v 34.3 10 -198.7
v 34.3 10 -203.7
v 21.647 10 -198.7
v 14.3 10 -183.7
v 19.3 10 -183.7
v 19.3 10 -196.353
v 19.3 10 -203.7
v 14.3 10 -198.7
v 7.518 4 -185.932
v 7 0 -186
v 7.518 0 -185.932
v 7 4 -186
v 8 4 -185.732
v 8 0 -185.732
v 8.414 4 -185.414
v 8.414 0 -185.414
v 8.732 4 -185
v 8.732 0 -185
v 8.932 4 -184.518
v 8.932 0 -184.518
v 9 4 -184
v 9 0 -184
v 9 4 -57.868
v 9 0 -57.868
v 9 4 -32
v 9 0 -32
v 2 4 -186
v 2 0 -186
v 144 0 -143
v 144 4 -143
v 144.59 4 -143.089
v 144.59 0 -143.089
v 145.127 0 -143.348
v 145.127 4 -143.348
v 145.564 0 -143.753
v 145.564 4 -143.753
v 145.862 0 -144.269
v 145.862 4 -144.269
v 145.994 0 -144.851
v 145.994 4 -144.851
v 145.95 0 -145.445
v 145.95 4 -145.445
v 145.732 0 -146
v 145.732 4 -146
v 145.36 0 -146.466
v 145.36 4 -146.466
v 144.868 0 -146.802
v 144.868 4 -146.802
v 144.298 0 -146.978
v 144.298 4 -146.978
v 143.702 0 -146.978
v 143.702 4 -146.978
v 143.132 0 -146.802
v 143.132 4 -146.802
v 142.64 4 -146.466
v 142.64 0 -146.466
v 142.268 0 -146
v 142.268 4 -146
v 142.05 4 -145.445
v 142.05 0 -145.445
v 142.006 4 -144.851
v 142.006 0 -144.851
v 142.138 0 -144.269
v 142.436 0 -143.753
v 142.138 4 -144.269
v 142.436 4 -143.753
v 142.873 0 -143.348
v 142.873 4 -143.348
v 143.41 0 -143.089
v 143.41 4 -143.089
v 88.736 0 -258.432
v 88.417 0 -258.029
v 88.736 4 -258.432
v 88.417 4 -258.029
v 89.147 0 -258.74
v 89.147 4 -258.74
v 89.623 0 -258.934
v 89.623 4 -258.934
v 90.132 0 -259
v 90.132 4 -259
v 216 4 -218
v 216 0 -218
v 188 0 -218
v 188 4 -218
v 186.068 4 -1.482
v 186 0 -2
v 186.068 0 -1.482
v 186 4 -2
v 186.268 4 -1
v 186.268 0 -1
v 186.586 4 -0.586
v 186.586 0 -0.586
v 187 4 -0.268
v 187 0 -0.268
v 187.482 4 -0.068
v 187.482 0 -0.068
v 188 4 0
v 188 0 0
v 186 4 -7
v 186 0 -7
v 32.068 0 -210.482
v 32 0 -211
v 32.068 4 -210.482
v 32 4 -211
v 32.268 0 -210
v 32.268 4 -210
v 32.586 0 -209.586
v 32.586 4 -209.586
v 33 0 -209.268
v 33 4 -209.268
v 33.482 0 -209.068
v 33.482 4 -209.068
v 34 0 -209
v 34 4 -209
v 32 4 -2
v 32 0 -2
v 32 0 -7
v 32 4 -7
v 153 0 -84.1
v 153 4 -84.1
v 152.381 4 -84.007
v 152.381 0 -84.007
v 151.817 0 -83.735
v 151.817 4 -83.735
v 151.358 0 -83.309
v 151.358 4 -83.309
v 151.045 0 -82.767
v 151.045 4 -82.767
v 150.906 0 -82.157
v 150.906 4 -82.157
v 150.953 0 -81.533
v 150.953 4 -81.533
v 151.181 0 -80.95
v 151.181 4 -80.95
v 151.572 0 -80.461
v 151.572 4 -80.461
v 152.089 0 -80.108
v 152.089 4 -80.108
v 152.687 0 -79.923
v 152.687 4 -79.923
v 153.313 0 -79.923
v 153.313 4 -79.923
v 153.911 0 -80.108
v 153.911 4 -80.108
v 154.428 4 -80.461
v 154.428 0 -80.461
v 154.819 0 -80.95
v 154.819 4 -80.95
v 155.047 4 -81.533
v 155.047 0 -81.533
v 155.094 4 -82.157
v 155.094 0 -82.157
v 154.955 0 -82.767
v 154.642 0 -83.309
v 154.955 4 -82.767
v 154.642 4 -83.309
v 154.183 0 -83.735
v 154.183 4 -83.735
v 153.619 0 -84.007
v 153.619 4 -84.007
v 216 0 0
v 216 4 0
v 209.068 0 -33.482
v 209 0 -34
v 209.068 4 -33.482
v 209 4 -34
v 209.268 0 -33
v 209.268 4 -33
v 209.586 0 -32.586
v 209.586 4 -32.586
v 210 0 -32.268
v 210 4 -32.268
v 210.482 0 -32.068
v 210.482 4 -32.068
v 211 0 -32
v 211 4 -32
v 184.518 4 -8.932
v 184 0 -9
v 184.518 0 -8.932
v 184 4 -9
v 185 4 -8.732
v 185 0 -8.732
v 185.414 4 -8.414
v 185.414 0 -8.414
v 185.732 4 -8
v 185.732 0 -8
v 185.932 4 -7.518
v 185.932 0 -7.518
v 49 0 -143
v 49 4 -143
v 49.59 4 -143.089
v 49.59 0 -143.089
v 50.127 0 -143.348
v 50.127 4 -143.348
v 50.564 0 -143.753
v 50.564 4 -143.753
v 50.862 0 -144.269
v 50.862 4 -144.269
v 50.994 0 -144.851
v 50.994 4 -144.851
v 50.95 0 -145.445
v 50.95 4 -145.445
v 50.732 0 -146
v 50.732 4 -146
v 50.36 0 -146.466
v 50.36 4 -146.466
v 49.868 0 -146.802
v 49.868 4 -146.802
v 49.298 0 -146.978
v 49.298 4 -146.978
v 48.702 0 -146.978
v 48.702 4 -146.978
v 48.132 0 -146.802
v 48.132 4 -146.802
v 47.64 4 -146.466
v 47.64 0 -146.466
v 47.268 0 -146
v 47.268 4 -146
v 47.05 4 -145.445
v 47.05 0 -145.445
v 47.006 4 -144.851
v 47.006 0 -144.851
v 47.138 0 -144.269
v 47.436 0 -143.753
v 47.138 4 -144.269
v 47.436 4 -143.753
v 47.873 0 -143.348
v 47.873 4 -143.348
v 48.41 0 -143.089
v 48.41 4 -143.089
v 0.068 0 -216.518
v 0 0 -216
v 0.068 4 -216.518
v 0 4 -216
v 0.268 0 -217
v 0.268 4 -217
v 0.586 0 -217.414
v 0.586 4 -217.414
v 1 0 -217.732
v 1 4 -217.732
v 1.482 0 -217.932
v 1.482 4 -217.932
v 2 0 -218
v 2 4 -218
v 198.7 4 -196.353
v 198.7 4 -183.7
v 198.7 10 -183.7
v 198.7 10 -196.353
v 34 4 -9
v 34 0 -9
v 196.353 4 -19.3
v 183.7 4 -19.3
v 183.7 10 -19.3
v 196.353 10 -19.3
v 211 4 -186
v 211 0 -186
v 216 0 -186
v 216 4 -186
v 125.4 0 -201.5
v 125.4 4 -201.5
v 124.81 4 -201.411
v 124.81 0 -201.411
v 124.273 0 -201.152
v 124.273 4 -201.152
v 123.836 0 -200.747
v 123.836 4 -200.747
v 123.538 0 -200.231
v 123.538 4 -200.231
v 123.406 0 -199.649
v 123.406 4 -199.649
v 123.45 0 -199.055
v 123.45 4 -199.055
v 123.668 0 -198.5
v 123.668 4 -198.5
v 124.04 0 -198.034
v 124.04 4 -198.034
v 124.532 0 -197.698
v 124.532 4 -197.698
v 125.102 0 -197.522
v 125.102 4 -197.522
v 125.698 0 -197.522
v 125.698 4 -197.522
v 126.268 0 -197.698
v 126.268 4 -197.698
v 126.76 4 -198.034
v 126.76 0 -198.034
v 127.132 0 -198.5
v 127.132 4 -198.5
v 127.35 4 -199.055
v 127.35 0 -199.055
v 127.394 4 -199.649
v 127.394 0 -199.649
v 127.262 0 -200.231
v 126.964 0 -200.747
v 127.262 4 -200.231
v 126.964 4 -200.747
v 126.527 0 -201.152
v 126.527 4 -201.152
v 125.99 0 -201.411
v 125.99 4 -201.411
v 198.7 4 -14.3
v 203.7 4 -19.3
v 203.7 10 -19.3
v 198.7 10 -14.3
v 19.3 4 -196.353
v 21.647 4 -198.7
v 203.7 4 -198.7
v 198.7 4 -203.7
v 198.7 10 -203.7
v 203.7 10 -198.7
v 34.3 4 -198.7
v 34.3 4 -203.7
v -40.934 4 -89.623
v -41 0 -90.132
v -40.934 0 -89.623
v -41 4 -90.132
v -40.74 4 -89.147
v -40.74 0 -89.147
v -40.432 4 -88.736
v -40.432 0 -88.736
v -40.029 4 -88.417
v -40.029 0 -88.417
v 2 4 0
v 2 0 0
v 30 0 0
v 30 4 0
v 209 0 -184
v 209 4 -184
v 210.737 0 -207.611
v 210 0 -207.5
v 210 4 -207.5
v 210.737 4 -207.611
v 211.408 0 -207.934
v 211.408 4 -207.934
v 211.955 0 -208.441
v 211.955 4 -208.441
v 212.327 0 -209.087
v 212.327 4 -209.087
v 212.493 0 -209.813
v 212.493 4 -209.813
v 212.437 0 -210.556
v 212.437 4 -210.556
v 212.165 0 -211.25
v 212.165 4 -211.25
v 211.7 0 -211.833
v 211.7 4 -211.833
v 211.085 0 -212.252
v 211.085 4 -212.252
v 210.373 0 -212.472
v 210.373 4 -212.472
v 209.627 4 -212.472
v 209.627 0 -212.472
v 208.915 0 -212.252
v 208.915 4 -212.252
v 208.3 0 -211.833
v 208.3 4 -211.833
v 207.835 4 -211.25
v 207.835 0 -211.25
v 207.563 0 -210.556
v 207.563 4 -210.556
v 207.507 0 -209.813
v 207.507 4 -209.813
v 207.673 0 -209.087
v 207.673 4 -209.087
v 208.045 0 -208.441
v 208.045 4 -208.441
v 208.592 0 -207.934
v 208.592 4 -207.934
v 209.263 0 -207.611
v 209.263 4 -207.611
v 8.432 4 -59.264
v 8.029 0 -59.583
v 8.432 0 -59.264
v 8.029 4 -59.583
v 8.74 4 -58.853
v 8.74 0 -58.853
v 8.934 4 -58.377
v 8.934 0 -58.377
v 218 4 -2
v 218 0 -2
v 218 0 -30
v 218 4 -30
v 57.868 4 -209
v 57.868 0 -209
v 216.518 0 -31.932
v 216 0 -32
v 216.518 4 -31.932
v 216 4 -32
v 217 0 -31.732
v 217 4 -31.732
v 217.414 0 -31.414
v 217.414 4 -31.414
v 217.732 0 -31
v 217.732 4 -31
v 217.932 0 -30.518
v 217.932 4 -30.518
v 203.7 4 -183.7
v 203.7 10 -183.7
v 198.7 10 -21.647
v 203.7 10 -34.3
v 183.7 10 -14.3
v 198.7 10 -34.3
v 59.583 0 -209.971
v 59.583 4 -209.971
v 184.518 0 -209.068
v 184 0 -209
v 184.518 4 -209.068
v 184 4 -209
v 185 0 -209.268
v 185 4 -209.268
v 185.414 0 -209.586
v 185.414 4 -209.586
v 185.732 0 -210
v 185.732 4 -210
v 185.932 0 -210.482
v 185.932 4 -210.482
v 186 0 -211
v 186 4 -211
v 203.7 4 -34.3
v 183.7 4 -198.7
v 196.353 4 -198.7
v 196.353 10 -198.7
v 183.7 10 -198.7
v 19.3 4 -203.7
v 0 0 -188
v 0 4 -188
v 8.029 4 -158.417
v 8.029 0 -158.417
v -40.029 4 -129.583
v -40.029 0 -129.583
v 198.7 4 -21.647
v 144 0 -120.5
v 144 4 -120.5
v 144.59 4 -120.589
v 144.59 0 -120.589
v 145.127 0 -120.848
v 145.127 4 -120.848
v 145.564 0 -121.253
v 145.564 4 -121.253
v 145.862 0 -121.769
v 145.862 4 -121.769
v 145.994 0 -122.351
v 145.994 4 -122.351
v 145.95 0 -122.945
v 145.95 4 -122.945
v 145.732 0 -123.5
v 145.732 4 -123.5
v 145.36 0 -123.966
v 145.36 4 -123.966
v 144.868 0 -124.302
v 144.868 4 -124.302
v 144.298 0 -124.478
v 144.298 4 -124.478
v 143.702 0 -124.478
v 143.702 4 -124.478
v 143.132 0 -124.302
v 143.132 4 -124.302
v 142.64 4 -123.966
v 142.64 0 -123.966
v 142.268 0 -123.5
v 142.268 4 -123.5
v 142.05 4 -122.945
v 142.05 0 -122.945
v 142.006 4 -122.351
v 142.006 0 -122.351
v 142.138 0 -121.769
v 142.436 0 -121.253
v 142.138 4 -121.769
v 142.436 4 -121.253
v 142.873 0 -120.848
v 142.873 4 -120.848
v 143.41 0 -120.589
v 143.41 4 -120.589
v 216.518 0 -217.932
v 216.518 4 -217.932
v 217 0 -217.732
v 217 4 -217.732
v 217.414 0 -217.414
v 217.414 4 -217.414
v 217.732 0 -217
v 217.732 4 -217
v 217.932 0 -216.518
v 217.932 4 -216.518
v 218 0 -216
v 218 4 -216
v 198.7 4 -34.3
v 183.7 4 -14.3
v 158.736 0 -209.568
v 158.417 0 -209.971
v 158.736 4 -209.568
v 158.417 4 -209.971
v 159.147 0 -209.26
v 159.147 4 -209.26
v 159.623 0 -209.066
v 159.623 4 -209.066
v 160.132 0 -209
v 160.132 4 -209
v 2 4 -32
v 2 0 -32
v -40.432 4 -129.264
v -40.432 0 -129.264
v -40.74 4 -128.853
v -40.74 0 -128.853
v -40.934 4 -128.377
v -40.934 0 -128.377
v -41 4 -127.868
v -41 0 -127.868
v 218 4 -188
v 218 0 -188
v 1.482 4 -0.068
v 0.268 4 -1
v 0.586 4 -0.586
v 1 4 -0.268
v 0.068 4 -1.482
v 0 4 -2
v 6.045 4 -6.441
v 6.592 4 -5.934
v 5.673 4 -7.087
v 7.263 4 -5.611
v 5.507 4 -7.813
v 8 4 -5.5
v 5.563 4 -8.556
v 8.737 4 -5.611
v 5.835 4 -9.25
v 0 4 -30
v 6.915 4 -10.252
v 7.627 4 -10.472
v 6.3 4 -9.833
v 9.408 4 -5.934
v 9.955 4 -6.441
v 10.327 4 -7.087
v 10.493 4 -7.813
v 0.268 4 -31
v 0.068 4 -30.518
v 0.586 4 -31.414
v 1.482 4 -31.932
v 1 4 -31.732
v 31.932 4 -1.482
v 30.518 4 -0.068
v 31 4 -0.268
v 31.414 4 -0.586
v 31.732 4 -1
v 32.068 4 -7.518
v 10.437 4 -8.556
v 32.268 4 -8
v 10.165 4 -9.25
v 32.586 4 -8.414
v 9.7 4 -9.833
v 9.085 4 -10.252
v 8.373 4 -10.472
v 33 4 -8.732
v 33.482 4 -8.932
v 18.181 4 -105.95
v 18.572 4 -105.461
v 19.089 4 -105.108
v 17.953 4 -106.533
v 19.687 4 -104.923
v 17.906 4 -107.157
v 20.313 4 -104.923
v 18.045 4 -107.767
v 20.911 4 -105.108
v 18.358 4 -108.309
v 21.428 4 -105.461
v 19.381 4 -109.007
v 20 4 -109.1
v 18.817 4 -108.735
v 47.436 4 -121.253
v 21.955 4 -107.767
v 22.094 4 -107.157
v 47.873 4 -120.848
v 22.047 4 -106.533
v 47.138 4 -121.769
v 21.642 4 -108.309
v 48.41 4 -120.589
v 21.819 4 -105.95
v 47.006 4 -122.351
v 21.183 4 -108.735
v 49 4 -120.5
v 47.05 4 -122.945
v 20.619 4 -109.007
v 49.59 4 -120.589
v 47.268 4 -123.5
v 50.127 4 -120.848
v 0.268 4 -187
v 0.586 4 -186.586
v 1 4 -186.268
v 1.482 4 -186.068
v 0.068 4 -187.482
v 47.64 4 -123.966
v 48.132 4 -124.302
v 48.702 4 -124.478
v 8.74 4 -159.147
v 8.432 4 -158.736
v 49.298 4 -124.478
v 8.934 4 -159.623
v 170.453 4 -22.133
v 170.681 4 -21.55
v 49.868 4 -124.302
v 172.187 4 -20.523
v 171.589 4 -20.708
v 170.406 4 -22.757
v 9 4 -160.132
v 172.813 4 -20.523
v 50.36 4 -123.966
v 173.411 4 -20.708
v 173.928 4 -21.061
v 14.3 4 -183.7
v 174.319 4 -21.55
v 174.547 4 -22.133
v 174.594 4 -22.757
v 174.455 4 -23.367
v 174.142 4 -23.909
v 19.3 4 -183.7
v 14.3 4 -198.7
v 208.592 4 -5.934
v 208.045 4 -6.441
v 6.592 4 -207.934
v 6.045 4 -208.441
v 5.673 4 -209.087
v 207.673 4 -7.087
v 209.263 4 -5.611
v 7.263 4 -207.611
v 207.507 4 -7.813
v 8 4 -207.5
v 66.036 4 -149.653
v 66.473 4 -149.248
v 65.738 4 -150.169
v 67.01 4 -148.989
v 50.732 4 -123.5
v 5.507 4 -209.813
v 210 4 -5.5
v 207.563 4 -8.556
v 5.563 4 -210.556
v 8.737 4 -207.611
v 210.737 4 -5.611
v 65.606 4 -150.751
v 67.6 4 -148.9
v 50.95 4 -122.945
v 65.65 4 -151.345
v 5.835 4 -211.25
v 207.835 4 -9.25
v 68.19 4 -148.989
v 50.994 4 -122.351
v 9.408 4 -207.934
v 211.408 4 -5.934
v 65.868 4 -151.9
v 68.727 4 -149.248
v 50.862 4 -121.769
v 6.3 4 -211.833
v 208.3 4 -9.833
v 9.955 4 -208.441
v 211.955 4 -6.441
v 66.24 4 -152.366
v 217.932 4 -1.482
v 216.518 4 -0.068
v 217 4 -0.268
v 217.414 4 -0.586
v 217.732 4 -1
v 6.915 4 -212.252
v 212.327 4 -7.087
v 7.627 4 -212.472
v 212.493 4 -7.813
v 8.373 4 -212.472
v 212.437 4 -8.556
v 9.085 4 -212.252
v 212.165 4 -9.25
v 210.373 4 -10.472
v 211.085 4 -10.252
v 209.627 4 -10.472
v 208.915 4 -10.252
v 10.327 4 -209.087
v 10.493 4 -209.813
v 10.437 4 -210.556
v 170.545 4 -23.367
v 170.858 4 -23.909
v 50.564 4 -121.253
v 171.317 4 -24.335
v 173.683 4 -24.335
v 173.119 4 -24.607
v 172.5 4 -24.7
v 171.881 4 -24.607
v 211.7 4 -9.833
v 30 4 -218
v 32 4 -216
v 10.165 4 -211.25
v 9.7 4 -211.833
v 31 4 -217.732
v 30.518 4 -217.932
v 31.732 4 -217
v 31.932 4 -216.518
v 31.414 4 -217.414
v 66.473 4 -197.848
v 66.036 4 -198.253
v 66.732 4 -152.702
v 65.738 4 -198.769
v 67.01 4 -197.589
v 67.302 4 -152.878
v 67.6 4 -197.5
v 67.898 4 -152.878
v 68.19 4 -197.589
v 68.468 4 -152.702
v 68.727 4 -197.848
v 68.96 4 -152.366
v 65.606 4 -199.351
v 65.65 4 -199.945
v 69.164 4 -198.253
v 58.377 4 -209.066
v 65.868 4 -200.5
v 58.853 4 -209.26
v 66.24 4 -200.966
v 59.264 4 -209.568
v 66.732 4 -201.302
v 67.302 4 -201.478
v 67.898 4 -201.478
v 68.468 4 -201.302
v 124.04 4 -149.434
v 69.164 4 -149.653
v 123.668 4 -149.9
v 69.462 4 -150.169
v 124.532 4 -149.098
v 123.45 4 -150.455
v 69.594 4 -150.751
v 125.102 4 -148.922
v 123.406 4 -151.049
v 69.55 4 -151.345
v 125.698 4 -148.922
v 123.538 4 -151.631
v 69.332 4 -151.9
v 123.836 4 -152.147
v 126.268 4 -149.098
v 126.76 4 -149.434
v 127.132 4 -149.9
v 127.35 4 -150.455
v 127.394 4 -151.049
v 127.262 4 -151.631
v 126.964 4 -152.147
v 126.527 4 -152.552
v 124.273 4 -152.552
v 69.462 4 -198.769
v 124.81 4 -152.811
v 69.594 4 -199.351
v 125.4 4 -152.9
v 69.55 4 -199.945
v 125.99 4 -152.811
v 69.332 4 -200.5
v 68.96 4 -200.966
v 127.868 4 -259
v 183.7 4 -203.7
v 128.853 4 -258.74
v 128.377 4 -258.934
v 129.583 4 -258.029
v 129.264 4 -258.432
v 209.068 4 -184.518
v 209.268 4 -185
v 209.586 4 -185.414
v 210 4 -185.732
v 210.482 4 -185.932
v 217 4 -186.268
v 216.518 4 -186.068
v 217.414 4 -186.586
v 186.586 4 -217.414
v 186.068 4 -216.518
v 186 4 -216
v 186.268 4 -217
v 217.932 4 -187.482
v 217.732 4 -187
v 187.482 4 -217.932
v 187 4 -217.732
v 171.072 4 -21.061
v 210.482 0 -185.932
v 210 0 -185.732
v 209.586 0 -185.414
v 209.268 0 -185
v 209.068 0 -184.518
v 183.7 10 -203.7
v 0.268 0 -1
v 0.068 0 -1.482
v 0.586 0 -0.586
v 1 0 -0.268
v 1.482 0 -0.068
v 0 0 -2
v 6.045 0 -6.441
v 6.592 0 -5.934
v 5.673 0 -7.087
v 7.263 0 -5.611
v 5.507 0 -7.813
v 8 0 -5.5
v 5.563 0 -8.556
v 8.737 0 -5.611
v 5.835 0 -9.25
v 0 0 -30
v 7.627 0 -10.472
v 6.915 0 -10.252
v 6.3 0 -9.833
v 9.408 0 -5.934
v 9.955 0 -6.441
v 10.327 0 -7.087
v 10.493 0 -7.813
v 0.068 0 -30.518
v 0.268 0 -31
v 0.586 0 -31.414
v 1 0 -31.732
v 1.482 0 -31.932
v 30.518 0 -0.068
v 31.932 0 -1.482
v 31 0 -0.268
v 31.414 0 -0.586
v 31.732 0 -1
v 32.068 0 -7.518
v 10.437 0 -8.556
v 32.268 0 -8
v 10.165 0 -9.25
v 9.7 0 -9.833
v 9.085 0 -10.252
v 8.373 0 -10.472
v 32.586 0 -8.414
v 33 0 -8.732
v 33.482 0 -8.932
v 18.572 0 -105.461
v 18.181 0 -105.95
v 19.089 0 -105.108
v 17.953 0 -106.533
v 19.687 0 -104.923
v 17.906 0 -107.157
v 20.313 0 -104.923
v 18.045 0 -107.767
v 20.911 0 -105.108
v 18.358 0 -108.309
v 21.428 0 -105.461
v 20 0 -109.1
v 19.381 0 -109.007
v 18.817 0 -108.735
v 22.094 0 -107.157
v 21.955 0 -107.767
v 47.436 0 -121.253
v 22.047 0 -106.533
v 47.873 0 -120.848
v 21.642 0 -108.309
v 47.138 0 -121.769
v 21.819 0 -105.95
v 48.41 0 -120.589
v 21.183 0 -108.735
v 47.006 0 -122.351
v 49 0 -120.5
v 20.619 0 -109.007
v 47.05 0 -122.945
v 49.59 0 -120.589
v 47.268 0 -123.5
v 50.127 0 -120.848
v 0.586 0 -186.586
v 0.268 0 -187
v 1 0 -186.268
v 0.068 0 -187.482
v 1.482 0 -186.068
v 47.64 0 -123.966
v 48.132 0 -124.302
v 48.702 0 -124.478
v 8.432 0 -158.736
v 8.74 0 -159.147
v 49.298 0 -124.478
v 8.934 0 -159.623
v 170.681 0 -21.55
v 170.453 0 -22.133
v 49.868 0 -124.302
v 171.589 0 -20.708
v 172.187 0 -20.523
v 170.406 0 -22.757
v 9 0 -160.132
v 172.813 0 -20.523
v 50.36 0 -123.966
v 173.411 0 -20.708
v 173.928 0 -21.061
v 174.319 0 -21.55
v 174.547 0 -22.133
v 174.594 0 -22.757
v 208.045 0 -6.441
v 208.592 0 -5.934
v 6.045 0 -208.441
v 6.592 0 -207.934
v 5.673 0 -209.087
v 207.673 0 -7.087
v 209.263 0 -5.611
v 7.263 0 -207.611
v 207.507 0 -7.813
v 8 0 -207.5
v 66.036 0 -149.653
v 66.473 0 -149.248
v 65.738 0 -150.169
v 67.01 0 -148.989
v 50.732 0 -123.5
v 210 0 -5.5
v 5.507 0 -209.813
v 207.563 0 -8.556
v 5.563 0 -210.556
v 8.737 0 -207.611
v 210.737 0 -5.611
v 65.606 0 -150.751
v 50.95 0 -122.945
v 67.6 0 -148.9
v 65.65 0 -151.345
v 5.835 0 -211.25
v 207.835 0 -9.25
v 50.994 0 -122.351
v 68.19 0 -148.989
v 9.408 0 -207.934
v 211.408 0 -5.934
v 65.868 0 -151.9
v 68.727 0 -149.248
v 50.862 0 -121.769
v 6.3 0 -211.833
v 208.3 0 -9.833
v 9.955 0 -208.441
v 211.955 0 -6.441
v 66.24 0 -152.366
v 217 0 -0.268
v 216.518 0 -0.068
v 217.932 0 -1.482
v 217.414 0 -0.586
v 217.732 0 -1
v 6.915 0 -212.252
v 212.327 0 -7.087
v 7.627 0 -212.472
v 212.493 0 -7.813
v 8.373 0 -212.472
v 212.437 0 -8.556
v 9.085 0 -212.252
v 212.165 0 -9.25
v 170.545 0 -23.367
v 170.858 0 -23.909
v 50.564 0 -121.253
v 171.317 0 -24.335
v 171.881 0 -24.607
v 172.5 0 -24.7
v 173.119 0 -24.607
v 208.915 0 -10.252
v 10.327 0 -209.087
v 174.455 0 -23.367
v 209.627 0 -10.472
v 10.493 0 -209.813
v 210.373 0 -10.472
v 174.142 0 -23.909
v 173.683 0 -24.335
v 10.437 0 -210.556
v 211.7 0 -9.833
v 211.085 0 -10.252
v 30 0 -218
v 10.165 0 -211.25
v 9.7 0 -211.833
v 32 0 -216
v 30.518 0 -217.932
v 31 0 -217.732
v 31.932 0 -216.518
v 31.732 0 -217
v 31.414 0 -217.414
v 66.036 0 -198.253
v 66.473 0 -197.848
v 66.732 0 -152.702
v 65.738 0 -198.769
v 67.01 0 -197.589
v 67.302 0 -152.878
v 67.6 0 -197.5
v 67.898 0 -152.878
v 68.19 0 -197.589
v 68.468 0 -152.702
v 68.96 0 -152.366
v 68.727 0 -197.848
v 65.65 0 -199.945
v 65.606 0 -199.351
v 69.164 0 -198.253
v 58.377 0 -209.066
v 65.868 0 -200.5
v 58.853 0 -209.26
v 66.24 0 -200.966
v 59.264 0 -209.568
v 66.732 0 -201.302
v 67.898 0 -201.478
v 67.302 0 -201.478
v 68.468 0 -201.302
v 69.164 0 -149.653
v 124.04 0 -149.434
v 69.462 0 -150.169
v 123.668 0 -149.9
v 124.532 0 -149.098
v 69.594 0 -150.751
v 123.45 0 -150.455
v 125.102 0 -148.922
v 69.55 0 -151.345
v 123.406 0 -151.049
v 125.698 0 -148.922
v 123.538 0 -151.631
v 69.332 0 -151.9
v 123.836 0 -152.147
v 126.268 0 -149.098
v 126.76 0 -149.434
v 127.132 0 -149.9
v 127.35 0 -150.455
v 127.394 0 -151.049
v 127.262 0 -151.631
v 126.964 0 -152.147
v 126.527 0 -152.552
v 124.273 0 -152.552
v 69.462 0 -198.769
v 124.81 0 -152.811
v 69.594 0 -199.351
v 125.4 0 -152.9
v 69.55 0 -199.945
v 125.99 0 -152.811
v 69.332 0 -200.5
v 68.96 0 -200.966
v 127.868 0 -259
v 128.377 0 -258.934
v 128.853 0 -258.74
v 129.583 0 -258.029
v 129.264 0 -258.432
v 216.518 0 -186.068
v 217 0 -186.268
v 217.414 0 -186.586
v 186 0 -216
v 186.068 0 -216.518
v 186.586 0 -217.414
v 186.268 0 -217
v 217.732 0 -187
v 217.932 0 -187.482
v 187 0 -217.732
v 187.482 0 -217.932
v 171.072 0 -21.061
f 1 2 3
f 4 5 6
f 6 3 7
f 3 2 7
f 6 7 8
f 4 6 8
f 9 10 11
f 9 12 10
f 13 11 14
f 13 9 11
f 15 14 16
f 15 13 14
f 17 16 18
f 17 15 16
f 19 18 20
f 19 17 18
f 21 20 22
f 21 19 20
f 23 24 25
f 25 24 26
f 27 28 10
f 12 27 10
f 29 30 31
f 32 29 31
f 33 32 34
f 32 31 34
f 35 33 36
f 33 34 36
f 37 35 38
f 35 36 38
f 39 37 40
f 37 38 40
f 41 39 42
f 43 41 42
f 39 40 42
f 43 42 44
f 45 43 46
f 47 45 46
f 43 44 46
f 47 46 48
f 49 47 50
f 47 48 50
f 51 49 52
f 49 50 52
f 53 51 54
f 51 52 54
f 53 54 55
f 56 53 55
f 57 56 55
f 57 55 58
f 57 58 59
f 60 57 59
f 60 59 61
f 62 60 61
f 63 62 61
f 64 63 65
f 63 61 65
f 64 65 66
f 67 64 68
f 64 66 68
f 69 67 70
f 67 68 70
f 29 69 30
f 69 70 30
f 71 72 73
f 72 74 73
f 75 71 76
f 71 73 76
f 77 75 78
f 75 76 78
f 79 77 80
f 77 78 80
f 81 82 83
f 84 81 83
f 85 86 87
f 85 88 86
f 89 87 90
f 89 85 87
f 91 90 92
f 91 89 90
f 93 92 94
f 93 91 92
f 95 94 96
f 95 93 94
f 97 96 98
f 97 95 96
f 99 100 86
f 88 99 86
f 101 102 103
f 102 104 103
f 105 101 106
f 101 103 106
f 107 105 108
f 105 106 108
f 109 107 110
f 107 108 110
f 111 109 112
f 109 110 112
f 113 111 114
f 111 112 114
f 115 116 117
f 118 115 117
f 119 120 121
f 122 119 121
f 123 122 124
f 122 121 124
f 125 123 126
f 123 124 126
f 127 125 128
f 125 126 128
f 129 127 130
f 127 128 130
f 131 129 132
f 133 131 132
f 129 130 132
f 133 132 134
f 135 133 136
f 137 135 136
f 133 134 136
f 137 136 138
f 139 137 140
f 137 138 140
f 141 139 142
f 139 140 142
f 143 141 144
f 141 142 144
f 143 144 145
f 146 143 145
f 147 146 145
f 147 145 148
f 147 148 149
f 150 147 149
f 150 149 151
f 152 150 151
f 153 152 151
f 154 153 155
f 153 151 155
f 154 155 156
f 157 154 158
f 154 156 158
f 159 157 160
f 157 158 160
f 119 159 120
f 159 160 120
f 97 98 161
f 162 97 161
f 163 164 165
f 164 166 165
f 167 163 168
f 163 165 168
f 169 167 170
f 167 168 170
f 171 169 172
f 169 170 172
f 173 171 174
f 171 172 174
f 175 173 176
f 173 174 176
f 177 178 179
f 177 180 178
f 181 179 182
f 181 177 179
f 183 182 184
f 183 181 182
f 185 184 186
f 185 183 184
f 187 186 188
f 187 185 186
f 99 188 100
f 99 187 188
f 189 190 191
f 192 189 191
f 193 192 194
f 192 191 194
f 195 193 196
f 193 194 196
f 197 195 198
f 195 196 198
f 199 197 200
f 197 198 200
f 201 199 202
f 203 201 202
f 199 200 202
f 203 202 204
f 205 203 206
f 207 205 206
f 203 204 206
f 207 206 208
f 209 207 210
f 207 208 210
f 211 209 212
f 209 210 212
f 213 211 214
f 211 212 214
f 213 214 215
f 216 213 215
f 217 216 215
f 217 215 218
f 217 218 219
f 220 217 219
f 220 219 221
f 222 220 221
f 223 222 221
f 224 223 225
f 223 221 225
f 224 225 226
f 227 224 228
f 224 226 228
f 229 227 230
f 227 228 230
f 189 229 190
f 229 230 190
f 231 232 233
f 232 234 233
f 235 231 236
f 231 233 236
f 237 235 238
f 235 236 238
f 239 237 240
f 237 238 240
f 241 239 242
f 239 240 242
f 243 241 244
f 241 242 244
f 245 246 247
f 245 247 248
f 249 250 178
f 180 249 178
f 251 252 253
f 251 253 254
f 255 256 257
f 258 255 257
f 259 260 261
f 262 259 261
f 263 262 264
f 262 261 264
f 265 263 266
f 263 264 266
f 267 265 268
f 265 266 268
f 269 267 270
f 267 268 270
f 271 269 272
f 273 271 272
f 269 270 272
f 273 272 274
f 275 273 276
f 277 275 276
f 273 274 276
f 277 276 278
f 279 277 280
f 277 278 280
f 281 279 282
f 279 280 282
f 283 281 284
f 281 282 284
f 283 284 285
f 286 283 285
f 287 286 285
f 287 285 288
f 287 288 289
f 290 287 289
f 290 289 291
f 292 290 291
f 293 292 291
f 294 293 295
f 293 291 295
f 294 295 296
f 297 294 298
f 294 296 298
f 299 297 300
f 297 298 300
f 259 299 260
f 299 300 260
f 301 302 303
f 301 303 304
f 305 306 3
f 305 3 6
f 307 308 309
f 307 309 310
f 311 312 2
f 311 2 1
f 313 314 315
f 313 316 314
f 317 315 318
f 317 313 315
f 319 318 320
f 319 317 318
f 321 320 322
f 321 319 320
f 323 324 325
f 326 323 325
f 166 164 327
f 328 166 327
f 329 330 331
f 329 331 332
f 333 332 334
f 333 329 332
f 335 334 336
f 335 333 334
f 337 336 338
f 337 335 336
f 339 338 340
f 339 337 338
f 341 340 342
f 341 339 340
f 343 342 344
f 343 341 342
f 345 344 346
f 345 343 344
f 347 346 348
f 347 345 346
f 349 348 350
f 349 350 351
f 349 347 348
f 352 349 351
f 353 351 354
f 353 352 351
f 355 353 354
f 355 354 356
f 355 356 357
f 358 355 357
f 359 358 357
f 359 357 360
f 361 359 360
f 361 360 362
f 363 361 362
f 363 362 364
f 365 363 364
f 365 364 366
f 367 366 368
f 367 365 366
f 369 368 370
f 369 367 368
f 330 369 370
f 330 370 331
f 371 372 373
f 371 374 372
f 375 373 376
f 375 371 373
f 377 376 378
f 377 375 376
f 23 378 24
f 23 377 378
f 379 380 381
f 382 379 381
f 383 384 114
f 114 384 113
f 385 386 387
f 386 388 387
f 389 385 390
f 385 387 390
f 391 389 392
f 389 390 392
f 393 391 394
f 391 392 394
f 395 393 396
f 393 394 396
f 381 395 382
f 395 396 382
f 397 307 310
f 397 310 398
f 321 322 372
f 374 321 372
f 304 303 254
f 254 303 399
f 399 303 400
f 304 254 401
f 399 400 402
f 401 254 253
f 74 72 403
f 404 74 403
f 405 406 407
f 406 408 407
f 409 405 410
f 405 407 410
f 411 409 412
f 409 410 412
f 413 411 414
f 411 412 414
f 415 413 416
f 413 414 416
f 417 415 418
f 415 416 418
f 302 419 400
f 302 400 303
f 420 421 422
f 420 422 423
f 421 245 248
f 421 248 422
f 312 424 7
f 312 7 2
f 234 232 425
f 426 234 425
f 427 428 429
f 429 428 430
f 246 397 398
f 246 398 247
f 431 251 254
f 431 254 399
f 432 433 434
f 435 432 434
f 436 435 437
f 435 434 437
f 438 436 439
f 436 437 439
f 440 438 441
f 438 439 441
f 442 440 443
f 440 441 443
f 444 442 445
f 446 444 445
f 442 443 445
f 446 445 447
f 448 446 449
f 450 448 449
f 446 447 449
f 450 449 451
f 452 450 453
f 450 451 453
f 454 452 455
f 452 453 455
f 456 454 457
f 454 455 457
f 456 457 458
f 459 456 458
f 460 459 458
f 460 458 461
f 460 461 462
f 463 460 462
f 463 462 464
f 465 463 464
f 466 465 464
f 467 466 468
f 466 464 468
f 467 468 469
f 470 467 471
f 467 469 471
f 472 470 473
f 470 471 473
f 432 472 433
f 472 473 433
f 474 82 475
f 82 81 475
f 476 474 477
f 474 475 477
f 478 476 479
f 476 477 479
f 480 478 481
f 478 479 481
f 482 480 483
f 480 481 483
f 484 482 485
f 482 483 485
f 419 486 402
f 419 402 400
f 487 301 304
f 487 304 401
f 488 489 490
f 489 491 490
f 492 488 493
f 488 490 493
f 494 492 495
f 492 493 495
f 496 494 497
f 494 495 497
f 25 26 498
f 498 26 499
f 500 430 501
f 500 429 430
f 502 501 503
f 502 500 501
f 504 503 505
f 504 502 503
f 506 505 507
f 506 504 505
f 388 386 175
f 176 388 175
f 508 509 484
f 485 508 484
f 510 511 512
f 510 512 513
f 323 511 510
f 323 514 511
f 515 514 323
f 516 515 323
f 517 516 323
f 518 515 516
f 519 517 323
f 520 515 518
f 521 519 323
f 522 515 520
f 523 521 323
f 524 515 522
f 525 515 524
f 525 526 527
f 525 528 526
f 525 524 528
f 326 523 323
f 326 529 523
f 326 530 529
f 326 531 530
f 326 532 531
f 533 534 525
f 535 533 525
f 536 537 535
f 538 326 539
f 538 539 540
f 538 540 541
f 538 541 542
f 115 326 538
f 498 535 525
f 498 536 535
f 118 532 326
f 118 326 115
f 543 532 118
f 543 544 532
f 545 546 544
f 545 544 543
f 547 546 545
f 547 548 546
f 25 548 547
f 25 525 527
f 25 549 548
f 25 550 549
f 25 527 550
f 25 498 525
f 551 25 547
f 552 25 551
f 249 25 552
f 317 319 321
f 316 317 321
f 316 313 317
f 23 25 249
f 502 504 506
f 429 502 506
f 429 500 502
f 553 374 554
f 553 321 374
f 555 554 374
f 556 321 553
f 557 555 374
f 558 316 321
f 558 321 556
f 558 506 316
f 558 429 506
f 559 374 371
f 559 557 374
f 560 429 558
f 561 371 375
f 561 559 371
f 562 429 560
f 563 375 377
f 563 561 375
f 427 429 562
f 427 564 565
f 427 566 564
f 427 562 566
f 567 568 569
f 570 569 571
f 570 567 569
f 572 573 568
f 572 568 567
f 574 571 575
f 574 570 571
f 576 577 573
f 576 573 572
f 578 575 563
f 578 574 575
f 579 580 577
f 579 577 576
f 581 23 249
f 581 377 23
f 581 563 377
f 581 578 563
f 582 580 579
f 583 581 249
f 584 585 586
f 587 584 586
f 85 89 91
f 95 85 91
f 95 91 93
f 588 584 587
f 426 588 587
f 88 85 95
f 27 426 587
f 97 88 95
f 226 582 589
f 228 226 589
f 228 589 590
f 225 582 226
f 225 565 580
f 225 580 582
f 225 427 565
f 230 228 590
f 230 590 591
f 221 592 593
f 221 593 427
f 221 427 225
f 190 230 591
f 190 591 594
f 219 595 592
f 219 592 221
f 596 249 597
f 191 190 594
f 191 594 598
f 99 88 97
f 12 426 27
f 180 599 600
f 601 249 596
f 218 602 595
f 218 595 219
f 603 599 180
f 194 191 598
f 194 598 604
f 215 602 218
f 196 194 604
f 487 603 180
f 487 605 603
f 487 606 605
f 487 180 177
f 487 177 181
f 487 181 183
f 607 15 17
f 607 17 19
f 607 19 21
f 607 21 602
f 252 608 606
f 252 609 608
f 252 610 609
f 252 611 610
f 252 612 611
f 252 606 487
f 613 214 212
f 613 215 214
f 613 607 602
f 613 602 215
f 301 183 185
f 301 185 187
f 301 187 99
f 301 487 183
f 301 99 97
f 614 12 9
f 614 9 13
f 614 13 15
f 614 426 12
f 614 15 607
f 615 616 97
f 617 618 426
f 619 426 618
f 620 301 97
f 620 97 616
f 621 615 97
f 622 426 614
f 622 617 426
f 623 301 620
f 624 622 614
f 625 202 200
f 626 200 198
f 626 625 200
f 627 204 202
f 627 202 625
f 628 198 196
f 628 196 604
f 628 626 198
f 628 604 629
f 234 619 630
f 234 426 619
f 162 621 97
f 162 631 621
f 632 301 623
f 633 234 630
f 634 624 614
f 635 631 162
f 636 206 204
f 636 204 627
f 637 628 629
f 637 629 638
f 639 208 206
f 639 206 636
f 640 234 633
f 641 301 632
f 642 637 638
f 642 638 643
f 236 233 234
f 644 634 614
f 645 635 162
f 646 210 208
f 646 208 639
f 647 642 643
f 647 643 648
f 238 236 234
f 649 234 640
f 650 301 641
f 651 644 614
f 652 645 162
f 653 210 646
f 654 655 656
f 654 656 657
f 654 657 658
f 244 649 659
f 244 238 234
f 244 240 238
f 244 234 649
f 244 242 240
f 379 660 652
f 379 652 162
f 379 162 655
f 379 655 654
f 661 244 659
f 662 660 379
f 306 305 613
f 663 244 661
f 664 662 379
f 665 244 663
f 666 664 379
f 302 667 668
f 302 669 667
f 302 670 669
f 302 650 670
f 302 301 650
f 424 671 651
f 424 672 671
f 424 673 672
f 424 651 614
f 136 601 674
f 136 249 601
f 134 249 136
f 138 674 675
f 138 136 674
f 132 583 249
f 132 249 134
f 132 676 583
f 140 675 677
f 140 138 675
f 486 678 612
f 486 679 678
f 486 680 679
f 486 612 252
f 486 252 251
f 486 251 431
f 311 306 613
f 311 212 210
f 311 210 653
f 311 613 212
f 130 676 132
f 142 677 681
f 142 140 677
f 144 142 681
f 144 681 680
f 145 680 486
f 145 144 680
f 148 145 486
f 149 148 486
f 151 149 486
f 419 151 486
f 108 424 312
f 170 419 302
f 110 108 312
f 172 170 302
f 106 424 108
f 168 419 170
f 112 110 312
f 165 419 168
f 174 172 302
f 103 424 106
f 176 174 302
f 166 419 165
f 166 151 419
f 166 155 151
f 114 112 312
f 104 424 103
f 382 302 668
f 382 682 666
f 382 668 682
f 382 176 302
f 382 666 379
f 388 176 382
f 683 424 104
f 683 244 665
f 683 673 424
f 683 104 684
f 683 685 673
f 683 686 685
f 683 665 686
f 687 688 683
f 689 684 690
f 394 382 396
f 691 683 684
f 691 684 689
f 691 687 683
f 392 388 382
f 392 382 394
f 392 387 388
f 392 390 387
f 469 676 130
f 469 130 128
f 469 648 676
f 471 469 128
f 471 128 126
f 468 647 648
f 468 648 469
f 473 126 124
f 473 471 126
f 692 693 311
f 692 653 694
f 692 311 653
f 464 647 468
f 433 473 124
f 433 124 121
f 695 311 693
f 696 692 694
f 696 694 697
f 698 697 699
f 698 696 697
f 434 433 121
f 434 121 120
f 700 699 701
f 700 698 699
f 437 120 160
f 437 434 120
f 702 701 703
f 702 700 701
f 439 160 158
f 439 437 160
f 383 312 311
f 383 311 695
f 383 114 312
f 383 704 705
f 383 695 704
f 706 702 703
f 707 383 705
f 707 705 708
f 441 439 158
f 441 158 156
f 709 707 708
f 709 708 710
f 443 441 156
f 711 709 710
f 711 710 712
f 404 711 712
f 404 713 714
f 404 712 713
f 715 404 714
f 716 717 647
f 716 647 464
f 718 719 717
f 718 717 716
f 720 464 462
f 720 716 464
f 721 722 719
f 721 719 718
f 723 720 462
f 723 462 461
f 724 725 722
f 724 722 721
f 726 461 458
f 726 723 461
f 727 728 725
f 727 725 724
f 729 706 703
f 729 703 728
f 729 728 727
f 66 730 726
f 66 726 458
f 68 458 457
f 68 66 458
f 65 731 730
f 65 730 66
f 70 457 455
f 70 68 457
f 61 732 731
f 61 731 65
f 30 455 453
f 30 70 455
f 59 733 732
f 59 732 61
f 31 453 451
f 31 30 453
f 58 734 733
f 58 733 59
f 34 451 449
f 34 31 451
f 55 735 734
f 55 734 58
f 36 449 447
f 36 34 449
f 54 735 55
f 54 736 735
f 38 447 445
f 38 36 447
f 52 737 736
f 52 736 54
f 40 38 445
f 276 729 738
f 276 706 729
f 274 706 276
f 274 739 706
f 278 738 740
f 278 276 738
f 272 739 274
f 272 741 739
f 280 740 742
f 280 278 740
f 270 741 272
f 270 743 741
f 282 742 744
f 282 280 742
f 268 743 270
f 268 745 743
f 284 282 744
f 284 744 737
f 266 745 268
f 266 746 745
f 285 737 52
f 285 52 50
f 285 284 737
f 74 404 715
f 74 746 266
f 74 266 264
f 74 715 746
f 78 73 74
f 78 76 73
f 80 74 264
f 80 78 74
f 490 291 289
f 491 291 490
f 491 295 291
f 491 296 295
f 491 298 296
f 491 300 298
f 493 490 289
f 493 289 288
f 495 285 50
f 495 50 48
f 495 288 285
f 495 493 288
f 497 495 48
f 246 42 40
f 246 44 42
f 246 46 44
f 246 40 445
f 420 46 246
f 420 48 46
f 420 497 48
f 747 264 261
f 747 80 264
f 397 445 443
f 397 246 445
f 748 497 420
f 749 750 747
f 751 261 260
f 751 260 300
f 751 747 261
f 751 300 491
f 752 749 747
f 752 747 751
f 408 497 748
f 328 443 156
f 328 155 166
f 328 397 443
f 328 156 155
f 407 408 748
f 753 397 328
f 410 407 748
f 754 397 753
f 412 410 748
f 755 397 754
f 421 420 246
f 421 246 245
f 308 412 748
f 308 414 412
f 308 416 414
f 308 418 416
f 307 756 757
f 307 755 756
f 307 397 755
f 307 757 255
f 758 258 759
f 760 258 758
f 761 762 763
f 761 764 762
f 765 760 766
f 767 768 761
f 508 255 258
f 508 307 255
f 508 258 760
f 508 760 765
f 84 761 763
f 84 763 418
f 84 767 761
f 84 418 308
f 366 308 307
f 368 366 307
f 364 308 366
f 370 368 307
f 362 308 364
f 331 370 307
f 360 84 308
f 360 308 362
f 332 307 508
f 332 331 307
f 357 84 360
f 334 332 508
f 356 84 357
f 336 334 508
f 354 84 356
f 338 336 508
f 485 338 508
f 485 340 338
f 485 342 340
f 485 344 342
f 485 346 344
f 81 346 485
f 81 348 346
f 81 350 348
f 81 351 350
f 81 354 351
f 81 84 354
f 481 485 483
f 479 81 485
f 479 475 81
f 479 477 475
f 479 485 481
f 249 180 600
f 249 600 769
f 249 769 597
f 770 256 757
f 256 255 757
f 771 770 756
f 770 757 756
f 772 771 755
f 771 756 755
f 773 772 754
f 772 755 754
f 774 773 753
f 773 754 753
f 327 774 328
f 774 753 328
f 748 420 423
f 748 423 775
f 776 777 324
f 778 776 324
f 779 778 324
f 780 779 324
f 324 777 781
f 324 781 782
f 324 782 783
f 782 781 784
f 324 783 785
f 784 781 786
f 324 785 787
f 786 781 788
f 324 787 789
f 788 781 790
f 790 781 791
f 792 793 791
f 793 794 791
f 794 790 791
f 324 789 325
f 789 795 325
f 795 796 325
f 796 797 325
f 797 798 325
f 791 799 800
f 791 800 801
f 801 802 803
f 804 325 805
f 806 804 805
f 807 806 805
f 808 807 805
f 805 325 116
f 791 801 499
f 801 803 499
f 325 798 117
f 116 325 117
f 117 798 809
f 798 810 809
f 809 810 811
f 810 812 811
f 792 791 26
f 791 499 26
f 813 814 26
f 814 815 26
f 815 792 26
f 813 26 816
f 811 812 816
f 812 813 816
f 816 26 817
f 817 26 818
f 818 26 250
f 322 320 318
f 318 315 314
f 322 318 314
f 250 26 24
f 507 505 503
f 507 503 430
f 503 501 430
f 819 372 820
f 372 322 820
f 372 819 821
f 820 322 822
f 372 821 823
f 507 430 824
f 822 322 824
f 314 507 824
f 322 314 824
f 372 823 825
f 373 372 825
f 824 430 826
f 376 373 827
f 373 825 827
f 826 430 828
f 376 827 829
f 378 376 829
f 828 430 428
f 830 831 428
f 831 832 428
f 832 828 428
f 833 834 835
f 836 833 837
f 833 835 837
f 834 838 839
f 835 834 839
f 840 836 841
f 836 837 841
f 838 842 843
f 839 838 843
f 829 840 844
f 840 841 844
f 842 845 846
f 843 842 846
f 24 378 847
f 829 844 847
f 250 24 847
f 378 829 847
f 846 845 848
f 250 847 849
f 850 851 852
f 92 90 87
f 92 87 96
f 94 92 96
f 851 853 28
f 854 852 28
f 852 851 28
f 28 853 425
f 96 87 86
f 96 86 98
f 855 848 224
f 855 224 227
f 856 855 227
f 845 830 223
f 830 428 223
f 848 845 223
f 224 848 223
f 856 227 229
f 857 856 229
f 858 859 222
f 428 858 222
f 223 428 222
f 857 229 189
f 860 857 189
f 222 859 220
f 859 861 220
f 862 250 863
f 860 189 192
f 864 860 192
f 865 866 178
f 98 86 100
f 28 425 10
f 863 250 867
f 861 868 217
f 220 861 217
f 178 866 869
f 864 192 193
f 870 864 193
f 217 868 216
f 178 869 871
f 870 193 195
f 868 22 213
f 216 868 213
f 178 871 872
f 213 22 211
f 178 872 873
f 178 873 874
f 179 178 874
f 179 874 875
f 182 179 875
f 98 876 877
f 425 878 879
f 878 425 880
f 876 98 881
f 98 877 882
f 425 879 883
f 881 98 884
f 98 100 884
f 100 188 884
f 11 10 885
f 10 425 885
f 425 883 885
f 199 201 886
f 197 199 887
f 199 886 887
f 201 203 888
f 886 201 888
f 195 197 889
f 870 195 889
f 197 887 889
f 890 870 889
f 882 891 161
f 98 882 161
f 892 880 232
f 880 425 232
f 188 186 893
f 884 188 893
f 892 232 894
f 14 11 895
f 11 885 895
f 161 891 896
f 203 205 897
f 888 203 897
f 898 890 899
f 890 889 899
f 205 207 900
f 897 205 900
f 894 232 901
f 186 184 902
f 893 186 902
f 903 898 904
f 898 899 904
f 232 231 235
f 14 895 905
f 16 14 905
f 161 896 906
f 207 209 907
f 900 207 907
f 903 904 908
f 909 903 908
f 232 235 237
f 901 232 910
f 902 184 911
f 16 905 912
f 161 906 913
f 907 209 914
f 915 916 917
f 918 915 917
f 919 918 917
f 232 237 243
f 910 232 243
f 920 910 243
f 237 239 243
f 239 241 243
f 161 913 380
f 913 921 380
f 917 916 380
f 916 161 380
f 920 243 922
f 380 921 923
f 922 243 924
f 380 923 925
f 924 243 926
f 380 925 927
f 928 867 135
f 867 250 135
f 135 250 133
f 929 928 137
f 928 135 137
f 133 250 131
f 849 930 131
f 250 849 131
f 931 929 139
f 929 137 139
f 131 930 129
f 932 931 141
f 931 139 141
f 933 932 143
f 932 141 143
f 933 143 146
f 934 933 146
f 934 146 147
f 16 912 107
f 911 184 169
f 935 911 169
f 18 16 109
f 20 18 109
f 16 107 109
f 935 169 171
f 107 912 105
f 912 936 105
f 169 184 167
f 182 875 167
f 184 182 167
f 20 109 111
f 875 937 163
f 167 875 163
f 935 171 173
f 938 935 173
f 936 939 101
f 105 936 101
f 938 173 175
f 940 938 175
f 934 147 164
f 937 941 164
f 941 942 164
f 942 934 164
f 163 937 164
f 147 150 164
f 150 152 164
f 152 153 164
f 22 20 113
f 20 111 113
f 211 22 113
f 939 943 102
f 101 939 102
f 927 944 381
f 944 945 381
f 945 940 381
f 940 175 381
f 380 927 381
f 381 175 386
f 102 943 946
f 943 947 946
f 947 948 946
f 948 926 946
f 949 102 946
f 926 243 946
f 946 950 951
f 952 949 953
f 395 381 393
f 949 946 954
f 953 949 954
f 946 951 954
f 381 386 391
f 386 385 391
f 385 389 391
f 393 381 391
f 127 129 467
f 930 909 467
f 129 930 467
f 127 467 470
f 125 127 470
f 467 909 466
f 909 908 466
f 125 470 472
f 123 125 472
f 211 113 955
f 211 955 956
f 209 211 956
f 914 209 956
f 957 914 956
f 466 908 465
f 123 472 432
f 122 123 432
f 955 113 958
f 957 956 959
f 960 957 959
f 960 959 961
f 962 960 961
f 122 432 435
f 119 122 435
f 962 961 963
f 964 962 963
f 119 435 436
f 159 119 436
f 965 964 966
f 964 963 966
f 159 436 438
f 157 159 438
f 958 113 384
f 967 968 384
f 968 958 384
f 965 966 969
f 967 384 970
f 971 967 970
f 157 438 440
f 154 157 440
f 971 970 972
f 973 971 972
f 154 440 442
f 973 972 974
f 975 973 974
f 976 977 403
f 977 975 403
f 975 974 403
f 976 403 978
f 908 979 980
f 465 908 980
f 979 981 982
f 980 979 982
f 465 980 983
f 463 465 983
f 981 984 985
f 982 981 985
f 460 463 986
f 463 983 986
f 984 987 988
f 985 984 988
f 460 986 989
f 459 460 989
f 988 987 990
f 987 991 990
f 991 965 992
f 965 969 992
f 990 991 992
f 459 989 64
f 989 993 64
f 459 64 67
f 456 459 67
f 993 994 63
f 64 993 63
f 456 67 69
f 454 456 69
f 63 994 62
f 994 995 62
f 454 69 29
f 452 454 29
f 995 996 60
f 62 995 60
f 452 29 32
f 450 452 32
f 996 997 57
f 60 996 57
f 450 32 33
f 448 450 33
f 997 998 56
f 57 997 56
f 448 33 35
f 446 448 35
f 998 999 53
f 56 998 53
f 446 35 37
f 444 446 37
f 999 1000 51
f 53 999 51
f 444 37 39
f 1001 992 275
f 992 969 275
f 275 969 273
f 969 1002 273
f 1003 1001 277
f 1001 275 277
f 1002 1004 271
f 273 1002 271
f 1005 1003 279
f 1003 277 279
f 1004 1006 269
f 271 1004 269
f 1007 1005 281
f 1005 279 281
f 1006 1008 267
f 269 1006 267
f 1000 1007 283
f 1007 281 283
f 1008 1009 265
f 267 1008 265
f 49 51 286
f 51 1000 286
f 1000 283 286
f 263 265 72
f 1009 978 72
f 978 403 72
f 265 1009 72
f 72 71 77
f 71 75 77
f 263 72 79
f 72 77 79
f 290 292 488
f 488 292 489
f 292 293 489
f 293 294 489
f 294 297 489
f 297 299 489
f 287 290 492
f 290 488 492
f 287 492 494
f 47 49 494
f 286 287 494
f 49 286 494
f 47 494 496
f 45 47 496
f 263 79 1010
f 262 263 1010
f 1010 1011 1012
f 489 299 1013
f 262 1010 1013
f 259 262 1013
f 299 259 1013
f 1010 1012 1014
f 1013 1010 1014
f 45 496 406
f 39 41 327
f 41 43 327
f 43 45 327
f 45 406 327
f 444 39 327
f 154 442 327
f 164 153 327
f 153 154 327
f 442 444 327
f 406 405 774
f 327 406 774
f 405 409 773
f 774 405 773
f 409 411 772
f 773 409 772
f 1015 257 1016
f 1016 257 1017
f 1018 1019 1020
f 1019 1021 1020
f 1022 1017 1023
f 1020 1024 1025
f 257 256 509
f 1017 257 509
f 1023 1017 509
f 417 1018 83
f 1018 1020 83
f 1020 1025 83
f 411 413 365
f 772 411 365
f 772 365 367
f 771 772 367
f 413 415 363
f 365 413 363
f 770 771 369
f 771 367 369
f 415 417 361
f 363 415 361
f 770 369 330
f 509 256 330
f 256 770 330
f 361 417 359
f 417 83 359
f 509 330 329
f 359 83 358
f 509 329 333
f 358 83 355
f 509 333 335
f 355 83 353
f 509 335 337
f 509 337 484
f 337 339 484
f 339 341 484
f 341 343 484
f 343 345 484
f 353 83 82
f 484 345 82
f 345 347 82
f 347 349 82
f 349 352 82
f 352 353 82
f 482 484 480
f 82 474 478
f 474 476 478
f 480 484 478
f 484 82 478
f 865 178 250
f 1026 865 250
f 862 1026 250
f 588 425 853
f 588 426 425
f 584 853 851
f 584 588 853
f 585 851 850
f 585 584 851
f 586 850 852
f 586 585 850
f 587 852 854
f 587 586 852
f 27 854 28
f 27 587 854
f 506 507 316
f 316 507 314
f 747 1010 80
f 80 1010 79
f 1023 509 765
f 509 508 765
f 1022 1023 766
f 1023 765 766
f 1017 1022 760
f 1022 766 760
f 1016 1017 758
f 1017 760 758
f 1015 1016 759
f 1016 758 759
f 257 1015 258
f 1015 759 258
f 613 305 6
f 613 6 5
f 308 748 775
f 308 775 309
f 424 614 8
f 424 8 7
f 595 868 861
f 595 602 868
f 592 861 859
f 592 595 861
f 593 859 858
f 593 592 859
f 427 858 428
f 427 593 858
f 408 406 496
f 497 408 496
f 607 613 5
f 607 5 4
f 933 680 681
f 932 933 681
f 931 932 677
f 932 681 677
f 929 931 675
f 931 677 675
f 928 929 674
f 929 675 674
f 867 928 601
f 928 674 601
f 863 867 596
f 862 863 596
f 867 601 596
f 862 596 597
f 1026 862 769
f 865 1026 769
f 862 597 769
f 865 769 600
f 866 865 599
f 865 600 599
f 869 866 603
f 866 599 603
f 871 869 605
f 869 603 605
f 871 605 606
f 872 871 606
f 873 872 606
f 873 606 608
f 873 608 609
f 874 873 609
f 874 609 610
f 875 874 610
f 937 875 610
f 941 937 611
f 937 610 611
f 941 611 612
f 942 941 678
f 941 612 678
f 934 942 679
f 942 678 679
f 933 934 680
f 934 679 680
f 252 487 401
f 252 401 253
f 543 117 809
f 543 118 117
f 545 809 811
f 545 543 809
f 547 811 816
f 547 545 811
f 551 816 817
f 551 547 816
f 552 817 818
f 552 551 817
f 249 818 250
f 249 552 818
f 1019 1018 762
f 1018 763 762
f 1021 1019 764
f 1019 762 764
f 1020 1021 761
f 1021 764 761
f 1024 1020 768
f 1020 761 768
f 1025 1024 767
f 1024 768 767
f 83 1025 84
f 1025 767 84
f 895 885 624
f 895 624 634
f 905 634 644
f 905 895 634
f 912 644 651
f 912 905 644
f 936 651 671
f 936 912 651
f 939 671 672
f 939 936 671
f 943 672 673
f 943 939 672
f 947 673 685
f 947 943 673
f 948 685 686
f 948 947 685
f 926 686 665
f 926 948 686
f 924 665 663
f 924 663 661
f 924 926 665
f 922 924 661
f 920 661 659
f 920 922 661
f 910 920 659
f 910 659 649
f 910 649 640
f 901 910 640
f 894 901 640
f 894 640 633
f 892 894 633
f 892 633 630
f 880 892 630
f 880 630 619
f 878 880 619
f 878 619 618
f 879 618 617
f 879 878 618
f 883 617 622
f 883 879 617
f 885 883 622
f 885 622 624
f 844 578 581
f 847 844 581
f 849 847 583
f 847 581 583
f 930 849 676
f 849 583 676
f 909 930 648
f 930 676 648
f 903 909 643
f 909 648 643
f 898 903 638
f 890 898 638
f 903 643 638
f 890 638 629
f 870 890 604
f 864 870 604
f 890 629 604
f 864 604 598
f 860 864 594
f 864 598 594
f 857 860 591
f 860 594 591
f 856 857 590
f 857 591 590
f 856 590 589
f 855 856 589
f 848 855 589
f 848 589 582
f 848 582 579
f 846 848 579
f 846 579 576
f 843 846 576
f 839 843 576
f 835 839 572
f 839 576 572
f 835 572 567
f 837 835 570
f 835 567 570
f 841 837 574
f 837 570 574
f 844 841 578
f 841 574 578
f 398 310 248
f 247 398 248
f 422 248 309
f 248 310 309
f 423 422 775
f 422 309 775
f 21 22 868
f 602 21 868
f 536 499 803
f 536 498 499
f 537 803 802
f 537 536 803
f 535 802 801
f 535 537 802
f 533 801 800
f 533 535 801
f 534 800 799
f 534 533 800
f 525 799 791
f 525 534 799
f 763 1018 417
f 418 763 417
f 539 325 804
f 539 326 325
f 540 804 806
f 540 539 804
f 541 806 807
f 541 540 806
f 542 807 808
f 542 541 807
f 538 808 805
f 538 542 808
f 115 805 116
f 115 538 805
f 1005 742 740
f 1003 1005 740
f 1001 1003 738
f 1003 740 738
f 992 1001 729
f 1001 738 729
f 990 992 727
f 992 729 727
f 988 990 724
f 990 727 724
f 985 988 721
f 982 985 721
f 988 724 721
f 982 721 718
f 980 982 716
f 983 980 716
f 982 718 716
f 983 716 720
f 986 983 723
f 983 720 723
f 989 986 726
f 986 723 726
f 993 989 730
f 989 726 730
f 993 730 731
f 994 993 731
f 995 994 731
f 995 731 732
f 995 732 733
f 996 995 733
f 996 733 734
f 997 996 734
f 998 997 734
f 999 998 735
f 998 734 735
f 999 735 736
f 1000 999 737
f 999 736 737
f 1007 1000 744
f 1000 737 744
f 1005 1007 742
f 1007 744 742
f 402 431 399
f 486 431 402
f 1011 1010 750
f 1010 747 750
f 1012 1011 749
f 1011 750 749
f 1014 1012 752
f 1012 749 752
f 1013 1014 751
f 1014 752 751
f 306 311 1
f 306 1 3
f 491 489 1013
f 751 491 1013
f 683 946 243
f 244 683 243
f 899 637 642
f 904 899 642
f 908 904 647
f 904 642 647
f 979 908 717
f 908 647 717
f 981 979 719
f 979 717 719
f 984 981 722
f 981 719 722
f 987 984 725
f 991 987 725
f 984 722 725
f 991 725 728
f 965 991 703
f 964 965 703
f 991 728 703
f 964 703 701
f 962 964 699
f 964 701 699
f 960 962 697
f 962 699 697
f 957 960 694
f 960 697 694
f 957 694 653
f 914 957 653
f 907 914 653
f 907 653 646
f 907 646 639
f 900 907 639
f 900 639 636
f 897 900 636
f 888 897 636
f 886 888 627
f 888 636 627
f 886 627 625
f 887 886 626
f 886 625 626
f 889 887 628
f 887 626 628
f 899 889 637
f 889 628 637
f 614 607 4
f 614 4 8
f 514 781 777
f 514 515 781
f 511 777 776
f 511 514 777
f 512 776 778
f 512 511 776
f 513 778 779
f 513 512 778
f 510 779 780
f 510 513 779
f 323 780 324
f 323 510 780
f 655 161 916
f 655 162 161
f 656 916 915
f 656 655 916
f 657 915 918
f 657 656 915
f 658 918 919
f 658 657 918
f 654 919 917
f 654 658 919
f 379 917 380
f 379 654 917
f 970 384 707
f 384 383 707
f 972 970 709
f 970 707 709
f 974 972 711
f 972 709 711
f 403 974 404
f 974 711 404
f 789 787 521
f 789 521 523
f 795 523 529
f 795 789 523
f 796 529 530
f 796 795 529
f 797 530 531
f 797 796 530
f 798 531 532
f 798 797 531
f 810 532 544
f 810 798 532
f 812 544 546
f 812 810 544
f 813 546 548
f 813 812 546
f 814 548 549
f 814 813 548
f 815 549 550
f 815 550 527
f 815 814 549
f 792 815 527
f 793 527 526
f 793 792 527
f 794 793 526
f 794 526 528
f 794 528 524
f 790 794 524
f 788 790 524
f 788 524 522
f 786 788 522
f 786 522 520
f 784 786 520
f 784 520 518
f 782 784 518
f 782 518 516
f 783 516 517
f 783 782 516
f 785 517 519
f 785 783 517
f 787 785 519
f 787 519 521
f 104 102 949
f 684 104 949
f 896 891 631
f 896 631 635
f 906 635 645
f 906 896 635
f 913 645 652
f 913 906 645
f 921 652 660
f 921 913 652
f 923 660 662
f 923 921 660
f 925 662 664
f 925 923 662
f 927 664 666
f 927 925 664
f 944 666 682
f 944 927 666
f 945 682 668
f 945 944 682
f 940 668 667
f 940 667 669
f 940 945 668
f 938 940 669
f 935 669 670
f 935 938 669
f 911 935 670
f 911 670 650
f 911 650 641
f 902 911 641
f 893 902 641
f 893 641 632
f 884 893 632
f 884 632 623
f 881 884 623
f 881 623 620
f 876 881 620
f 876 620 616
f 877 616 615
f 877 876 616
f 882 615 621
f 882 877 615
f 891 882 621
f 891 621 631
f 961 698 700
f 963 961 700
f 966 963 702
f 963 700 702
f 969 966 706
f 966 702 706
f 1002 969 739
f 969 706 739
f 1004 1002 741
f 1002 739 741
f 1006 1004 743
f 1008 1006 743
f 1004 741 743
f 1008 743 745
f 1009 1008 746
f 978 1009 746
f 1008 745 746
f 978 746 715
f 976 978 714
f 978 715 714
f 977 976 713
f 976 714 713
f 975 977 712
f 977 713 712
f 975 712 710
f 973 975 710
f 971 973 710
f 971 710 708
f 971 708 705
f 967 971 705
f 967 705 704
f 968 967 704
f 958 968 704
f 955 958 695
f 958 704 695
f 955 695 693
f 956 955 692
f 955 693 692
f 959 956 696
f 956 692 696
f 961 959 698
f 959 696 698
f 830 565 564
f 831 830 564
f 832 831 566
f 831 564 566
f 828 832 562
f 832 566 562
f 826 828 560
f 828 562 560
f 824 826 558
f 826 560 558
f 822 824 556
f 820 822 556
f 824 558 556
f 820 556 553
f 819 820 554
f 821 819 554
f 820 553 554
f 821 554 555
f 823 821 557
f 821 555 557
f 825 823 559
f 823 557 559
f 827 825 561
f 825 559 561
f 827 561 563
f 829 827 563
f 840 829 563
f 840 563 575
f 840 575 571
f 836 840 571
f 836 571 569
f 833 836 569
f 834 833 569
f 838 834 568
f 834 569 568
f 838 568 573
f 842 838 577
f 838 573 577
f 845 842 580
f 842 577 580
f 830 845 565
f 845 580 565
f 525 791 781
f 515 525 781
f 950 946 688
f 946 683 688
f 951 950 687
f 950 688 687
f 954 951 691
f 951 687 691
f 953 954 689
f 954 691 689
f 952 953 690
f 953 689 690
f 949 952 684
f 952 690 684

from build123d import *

# Parameters (mm, degrees)
ESQUISSE1_R             = 2.5
BOSS_EXTRU_1_DEPTH      = 4
ESQUISSE2_R             = 2.1
ESQUISSE2_R_2           = 2
ENL_V_MAT_EXTRU_1_DEPTH = 4
BOSS_EXTRU_2_DEPTH      = 6
CONG_1_R                = 2


with BuildPart() as part:
    # Esquisse1 → Boss.-Extru.1 (new body)
    with BuildSketch(Plane(origin=(0, 0, 0), x_dir=(1, 0, 0), z_dir=(0, 1, 0))):
        Polygon((0, 218), (0, 186), (9, 186), (9, 159), (-41, 129), (-41, 89), (9, 59), (9, 32), (0, 32), (0, 0), (32, 0), (32, 9), (186, 9), (186, 0), (218, 0), (218, 32), (209, 32), (209, 186), (218, 186), (218, 218), (186, 218), (186, 209), (159, 209), (129, 259), (89, 259), (59, 209), (32, 209), (32, 218), align=None)
        with Locations(Location((8, 210, 0), (0, 0, 270))):
            Circle(ESQUISSE1_R, mode=Mode.SUBTRACT)
        with Locations(Location((210, 210, 0), (0, 0, 270))):
            Circle(ESQUISSE1_R, mode=Mode.SUBTRACT)
        with Locations(Location((210, 8, 0), (0, 0, 270))):
            Circle(ESQUISSE1_R, mode=Mode.SUBTRACT)
        with Locations(Location((8, 8, 0), (0, 0, 270))):
            Circle(ESQUISSE1_R, mode=Mode.SUBTRACT)
    extrude(amount=BOSS_EXTRU_1_DEPTH)

    # Esquisse2 → Enlèv. mat.-Extru.1 (cut)
    with BuildSketch(Plane(origin=(0, 4, 0), x_dir=(1, 0, 0), z_dir=(0, 1, 0))):
        with Locations(Location((172.5, 22.6, 0), (0, 0, 90))):
            Circle(ESQUISSE2_R)
        with Locations(Location((153, 82, 0), (0, 0, 90))):
            Circle(ESQUISSE2_R)
        with Locations(Location((20, 107, 0), (0, 0, 90))):
            Circle(ESQUISSE2_R)
        with Locations(Location((49, 122.5, 0), (0, 0, 270))):
            Circle(ESQUISSE2_R_2)
        with Locations(Location((144, 122.5, 0), (0, 0, 270))):
            Circle(ESQUISSE2_R_2)
        with Locations(Location((144, 145, 0), (0, 0, 270))):
            Circle(ESQUISSE2_R_2)
        with Locations(Location((49, 145, 0), (0, 0, 270))):
            Circle(ESQUISSE2_R_2)
        with Locations(Location((67.6, 199.5, 0), (0, 0, 270))):
            Circle(ESQUISSE2_R_2)
        with Locations(Location((67.6, 150.9, 0), (0, 0, 270))):
            Circle(ESQUISSE2_R_2)
        with Locations(Location((125.4, 150.9, 0), (0, 0, 90))):
            Circle(ESQUISSE2_R_2)
        with Locations(Location((125.4, 199.5, 0), (0, 0, 90))):
            Circle(ESQUISSE2_R_2)
    extrude(amount=-ENL_V_MAT_EXTRU_1_DEPTH, mode=Mode.SUBTRACT)

    # Esquisse4 → Boss.-Extru.2 (add)
    with BuildSketch(Plane(origin=(0, 4, 0), x_dir=(1, 0, 0), z_dir=(0, 1, 0))):
        Polygon((198.7, 14.3), (183.7, 14.3), (183.7, 19.3), (196.353215425, 19.3), (198.7, 21.646784575), (198.7, 34.3), (203.7, 34.3), (203.7, 19.3), align=None)
        Polygon((19.3, 203.7), (34.3, 203.7), (34.3, 198.7), (21.646784575, 198.7), (19.3, 196.353215425), (19.3, 183.7), (14.3, 183.7), (14.3, 198.7), align=None)
        Polygon((203.7, 198.7), (203.7, 183.7), (198.7, 183.7), (198.7, 196.353215425), (196.353215425, 198.7), (183.7, 198.7), (183.7, 203.7), (198.7, 203.7), align=None)
    extrude(amount=BOSS_EXTRU_2_DEPTH)

    # Congé1
    cong_1_edges = [part.edges().sort_by_distance(p)[0] for p in [
        (0, 2, 0),
        (0, 2, -32),
        (9, 2, -59),
        (-41, 2, -89),
        (-41, 2, -129),
        (9, 2, -159),
        (9, 2, -186),
        (0, 2, -186),
        (0, 2, -218),
        (32, 2, -218),
        (32, 2, -209),
        (59, 2, -209),
        (89, 2, -259),
        (129, 2, -259),
        (159, 2, -209),
        (186, 2, -209),
        (186, 2, -218),
        (218, 2, -218),
        (218, 2, -186),
        (209, 2, -186),
        (209, 2, -32),
        (218, 2, -32),
        (218, 2, 0),
        (186, 2, 0),
        (186, 2, -9),
        (32, 2, -9),
        (32, 2, 0),
    ]]
    fillet(cong_1_edges, radius=CONG_1_R)


solid = part.part
